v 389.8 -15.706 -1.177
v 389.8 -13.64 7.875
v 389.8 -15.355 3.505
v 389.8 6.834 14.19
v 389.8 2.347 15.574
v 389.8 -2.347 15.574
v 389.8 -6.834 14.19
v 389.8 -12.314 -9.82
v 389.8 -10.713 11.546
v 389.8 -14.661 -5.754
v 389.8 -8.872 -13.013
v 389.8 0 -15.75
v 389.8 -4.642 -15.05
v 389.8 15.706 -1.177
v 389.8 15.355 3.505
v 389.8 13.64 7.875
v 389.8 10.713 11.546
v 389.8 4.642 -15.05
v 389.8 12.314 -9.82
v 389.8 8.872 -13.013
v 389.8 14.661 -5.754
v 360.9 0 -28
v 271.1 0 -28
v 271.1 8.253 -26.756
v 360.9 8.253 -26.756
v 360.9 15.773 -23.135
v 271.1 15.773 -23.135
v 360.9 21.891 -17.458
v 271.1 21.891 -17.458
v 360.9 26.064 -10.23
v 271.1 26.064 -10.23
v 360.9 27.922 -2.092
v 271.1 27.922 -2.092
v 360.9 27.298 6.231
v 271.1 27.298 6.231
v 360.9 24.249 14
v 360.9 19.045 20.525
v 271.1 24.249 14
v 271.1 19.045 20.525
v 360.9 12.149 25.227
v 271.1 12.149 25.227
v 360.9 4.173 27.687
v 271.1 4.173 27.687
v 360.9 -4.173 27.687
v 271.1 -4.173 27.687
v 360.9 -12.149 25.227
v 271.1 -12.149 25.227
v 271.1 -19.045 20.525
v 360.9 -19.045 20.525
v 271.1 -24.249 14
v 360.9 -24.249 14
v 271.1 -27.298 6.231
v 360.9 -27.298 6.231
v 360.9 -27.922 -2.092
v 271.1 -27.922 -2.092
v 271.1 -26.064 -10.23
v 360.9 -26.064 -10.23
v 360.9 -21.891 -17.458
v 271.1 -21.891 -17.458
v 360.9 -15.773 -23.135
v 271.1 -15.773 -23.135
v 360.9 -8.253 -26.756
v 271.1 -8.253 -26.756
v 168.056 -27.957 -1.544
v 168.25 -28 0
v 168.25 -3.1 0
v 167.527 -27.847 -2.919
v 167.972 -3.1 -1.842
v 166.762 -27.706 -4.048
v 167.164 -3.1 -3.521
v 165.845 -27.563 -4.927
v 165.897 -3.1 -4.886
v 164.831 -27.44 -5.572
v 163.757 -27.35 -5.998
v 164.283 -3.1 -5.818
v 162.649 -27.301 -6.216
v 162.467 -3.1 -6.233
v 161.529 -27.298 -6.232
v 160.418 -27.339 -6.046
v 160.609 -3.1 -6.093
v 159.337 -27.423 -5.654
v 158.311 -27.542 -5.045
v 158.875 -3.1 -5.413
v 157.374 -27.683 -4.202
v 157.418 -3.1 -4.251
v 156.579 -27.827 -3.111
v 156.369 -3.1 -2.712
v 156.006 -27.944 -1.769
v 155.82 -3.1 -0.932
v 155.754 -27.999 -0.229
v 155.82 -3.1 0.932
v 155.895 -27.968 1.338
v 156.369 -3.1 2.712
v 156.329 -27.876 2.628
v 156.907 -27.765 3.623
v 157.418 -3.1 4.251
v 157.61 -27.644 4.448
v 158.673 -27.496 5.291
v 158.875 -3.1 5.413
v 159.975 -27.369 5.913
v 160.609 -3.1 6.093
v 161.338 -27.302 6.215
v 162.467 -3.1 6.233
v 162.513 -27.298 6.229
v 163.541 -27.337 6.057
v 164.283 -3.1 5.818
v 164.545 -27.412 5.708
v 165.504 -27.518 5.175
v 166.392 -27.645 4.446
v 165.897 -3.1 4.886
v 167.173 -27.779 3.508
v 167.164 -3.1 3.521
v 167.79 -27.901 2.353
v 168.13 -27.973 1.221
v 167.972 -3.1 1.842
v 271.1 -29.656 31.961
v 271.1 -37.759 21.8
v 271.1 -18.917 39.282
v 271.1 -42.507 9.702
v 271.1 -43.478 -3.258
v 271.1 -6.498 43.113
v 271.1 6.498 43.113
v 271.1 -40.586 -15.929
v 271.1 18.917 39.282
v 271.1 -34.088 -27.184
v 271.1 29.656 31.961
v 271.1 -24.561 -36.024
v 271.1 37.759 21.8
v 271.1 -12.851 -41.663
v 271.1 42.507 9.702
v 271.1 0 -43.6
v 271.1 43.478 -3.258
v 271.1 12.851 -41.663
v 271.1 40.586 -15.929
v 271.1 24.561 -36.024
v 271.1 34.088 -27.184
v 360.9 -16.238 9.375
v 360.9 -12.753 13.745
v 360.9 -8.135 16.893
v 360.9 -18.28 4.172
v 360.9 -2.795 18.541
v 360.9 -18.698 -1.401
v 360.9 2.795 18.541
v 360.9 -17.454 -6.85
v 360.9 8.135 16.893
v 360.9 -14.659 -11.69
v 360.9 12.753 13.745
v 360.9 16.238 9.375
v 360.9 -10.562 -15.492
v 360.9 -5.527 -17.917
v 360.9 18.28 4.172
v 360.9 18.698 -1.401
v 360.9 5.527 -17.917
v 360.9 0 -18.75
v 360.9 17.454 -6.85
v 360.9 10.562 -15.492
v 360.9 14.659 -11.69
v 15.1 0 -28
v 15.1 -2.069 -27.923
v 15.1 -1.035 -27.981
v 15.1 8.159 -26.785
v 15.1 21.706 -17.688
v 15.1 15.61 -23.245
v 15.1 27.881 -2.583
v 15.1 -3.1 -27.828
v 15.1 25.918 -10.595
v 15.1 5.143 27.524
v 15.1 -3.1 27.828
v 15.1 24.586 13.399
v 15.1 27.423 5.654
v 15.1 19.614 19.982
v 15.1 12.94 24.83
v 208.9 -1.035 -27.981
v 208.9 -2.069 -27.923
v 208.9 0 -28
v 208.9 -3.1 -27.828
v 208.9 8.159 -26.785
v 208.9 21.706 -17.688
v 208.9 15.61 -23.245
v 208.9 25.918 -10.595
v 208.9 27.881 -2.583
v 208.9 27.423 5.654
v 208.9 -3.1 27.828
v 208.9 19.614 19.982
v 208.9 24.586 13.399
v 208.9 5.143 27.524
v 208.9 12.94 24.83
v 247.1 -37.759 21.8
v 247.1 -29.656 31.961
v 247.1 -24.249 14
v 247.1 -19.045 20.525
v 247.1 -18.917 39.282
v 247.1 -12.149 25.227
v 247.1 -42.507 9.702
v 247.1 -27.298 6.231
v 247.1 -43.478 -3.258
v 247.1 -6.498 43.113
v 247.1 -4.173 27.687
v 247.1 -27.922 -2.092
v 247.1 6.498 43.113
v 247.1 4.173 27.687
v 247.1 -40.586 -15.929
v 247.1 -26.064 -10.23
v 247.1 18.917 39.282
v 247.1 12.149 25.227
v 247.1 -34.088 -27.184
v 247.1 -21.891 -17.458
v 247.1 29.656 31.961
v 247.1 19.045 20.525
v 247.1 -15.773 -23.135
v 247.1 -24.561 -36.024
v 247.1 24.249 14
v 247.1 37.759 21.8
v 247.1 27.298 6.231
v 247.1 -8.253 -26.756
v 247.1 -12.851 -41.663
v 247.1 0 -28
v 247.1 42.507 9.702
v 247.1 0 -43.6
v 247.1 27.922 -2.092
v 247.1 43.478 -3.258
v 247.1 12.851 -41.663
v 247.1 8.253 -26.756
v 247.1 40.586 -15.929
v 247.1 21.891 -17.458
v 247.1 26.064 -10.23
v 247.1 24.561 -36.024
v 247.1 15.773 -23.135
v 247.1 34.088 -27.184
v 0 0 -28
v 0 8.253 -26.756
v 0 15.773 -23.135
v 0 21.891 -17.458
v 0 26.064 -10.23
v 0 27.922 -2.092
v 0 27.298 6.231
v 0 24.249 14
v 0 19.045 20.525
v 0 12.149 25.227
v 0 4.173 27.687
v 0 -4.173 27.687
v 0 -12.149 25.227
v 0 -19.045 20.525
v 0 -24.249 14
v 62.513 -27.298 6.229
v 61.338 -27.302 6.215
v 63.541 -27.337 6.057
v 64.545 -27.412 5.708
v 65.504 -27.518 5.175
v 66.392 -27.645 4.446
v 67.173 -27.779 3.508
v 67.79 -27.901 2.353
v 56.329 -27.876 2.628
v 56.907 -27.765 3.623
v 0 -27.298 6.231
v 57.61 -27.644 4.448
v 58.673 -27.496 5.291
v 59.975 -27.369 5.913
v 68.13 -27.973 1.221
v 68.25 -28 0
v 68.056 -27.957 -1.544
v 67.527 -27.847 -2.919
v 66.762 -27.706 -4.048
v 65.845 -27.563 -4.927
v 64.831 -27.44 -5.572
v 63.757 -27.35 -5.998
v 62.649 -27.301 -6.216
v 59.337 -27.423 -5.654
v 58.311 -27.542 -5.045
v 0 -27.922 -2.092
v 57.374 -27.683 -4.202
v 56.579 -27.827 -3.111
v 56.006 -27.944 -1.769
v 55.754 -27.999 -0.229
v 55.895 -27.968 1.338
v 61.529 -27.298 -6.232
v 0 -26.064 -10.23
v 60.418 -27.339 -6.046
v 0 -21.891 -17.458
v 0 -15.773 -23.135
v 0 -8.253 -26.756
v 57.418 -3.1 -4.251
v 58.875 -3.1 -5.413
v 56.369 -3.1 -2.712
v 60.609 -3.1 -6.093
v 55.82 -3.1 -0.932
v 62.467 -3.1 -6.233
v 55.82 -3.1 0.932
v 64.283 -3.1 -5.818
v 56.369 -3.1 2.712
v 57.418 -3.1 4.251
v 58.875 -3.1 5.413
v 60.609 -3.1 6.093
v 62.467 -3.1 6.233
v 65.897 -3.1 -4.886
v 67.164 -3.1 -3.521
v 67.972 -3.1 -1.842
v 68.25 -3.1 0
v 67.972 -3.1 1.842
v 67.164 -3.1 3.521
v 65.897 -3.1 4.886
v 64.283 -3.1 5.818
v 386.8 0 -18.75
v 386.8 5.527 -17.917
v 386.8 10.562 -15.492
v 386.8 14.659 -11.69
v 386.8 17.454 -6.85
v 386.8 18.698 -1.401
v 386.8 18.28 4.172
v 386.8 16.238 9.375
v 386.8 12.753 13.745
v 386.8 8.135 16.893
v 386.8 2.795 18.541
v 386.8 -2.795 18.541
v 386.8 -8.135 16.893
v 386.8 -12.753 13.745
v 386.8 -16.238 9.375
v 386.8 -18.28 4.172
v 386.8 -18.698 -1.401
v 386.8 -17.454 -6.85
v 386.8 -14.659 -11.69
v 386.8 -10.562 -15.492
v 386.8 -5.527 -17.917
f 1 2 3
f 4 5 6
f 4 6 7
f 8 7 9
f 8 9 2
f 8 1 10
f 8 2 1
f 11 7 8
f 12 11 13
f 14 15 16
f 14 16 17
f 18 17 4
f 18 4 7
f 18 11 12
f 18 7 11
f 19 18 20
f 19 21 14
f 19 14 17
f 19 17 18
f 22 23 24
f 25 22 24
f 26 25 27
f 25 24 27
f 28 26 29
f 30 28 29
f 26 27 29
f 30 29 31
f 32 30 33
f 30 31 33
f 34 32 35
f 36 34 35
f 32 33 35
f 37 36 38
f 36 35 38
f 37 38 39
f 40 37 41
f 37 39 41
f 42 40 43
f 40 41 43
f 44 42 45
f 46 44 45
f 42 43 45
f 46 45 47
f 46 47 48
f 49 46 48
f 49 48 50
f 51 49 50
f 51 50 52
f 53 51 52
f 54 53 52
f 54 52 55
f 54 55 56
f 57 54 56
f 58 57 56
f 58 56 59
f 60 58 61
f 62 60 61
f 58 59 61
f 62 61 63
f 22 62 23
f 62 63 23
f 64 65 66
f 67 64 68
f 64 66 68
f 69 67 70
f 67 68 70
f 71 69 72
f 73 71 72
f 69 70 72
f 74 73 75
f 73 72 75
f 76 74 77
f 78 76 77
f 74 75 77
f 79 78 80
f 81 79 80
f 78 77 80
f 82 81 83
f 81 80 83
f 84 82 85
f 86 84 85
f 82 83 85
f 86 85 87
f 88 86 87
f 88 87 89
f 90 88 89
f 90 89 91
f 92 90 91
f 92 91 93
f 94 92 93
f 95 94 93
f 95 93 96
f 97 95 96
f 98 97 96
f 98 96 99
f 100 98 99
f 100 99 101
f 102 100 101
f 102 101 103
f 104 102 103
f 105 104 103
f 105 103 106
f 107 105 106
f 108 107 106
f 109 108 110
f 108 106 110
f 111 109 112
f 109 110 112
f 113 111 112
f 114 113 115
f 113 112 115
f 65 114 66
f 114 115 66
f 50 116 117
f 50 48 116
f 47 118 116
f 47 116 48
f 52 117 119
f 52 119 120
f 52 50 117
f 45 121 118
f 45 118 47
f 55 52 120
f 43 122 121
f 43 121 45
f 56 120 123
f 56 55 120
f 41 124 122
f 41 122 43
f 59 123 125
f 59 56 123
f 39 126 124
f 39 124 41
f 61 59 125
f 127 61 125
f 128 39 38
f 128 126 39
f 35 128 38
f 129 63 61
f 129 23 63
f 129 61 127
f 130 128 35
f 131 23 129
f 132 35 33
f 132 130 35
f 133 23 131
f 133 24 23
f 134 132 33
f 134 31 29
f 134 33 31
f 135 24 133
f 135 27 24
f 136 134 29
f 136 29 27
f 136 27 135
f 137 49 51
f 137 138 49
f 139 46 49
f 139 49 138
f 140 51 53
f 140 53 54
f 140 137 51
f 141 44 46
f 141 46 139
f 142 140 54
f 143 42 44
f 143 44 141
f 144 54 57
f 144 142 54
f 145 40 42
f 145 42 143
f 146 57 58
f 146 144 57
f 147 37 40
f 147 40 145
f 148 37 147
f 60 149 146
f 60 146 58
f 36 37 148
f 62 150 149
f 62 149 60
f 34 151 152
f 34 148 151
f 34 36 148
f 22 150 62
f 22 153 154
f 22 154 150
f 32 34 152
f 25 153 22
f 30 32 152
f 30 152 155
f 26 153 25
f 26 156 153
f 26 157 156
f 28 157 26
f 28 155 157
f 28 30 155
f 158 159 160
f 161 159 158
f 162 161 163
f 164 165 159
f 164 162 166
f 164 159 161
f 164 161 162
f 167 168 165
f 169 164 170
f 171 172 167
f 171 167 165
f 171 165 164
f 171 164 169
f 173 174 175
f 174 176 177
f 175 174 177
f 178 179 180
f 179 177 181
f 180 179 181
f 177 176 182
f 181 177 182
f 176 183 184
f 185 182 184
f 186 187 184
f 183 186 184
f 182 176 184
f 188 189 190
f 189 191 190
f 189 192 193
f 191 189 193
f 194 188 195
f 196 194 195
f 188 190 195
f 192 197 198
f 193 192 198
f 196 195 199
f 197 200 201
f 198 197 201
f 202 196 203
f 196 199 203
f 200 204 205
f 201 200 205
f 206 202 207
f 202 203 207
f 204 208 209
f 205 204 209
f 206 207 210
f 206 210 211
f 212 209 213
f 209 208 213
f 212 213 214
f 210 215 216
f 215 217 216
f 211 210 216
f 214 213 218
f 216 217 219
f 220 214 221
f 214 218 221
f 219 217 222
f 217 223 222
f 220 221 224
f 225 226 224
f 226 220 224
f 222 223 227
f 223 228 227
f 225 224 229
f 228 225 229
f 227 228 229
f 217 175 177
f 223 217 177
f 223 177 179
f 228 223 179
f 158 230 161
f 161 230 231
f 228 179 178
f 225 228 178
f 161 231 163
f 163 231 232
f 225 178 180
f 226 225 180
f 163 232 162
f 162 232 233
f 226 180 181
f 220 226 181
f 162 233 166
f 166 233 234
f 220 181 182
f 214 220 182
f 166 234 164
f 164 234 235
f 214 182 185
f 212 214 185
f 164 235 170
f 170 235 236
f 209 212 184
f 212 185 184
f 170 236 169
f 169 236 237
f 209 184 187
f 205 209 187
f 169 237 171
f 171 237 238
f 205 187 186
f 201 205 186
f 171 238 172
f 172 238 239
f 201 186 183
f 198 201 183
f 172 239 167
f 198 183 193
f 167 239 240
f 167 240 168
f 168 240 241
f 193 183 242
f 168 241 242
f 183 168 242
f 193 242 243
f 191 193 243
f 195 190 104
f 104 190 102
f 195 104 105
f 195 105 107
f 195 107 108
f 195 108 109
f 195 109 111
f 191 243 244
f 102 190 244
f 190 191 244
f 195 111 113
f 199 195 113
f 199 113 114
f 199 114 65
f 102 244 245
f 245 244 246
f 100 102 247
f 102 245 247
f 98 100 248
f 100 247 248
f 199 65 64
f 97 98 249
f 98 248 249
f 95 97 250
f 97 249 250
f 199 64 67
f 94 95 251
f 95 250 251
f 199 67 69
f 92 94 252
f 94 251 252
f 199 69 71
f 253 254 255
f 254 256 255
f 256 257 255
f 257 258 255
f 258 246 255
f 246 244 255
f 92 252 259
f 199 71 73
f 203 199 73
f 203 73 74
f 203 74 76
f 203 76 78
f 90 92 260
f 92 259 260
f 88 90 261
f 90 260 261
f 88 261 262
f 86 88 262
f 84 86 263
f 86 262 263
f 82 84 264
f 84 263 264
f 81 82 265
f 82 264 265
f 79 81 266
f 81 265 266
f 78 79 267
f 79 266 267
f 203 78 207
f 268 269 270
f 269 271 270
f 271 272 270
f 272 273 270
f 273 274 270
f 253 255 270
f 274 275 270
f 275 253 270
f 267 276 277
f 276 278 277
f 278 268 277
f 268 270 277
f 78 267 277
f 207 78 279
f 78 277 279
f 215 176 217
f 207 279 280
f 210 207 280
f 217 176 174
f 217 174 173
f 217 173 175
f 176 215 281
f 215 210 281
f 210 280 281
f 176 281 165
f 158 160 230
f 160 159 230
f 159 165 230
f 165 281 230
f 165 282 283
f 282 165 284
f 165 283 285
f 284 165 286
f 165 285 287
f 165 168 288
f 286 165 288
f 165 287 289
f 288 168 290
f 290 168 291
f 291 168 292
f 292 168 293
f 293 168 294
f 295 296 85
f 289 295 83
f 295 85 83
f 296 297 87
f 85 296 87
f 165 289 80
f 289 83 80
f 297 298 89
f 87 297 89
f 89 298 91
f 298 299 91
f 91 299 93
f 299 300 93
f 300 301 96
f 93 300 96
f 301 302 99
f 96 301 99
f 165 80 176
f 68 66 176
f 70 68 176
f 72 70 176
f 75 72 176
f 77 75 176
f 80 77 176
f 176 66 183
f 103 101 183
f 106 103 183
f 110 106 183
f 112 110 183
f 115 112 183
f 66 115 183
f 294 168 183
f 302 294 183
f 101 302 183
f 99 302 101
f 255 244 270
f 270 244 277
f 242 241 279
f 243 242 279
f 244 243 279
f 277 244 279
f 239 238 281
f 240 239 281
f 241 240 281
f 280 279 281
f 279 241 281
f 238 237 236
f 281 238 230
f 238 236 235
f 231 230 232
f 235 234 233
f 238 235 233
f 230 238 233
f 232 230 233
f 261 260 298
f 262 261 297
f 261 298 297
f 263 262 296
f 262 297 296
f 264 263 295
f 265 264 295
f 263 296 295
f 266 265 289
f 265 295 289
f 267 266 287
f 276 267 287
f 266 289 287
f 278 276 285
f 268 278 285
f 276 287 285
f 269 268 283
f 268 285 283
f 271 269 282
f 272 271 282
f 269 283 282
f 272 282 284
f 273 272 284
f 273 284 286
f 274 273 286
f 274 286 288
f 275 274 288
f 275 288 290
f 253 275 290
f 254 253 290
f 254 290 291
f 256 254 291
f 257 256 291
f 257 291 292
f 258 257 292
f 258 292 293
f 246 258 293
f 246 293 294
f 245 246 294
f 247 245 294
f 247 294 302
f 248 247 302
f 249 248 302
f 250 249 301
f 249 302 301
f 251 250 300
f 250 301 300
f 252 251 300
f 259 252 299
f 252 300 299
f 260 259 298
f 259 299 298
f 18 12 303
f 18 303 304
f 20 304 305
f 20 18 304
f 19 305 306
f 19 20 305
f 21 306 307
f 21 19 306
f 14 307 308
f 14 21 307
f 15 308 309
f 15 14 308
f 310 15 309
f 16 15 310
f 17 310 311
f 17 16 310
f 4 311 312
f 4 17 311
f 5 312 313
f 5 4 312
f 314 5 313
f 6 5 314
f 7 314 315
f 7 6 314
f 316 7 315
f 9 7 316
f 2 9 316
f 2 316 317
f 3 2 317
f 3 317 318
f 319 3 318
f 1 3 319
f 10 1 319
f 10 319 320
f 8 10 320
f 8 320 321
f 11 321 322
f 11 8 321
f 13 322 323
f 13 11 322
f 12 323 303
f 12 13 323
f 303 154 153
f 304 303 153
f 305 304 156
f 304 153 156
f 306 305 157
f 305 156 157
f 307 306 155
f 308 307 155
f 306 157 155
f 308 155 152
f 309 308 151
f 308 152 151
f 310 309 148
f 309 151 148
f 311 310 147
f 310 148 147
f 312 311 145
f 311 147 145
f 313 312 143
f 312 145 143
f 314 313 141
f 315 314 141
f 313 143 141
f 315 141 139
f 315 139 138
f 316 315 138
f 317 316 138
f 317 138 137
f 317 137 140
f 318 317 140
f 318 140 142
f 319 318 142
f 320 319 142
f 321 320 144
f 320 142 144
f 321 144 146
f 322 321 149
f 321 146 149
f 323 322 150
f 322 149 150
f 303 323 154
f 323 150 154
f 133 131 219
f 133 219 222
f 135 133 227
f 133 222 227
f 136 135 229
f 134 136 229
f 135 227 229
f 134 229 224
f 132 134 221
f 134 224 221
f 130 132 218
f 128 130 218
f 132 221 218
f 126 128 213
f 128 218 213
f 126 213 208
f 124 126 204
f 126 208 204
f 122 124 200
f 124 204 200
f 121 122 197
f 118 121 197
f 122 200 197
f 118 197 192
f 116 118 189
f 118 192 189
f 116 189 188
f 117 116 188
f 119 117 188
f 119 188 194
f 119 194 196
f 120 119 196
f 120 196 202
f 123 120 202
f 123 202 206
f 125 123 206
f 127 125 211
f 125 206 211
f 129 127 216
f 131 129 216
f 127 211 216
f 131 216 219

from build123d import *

# Parameters (mm, degrees)
SKETCH1_R           = 28
BOSS_EXTRUDE1_DEPTH = 247.1
SKETCH2_R           = 43.6
BOSS_EXTRUDE2_DEPTH = 24
SKETCH3_R           = 28
BOSS_EXTRUDE3_DEPTH = 89.8
SKETCH4_R           = 18.75
BOSS_EXTRUDE4_DEPTH = 28.9
CHAMFER1_SIZE       = 3
SKETCH5_W           = 193.8
SKETCH5_H           = 31.1
CUT_EXTRUDE1_DEPTH  = 54.45
CUT_EXTRUDE2_REACH  = 42.5
SKETCH6_R           = 6.25


with BuildPart() as part:
    # Sketch1 → Boss-Extrude1 (new body)
    with BuildSketch(Plane(origin=(0, 0, 0), x_dir=(0, 0, -1), z_dir=(1, 0, 0))):
        Circle(SKETCH1_R)
    extrude(amount=BOSS_EXTRUDE1_DEPTH)

    # Sketch2 → Boss-Extrude2 (add)
    with BuildSketch(Plane(origin=(247.1, 0, 0), x_dir=(0, 0, -1), z_dir=(1, 0, 0))):
        Circle(SKETCH2_R)
    extrude(amount=BOSS_EXTRUDE2_DEPTH)

    # Sketch3 → Boss-Extrude3 (add)
    with BuildSketch(Plane(origin=(271.1, 0, 0), x_dir=(0, 0, -1), z_dir=(1, 0, 0))):
        Circle(SKETCH3_R)
    extrude(amount=BOSS_EXTRUDE3_DEPTH)

    # Sketch4 → Boss-Extrude4 (add)
    with BuildSketch(Plane(origin=(360.9, 0, 0), x_dir=(0, 0, -1), z_dir=(1, 0, 0))):
        Circle(SKETCH4_R)
    extrude(amount=BOSS_EXTRUDE4_DEPTH)

    # Chamfer1
    chamfer1_edges = [part.edges().sort_by_distance(p)[0] for p in [
        (389.8, 0, 18.75),
    ]]
    chamfer(chamfer1_edges, length=CHAMFER1_SIZE)

    # Sketch5 → Cut-Extrude1 (cut, symmetric)
    with BuildSketch(Plane.XY):
        with Locations((112, 12.45)):
            Rectangle(SKETCH5_W, SKETCH5_H)
    extrude(amount=CUT_EXTRUDE1_DEPTH, both=True, mode=Mode.SUBTRACT)

    # Sketch6 → Cut-Extrude2 (cut, up to next)
    with BuildSketch(Plane(origin=(0, -3.1, 0), x_dir=(1, 0, 0), z_dir=(0, 1, 0)), mode=Mode.PRIVATE) as cut_extrude2_sk1:
        with Locations((62, 0)):
            Circle(SKETCH6_R)
    cut_extrude2_tool1 = extrude(cut_extrude2_sk1.sketch, amount=-CUT_EXTRUDE2_REACH, mode=Mode.PRIVATE) & part.part
    add(cut_extrude2_tool1.solids().sort_by_distance((62, -3.1, 0))[0], mode=Mode.SUBTRACT)
    # Sketch6 → Cut-Extrude2 (cut, up to next)
    with BuildSketch(Plane(origin=(0, -3.1, 0), x_dir=(1, 0, 0), z_dir=(0, 1, 0)), mode=Mode.PRIVATE) as cut_extrude2_sk2:
        with Locations((162, 0)):
            Circle(SKETCH6_R)
    cut_extrude2_tool2 = extrude(cut_extrude2_sk2.sketch, amount=-CUT_EXTRUDE2_REACH, mode=Mode.PRIVATE) & part.part
    add(cut_extrude2_tool2.solids().sort_by_distance((162, -3.1, 0))[0], mode=Mode.SUBTRACT)


solid = part.part
